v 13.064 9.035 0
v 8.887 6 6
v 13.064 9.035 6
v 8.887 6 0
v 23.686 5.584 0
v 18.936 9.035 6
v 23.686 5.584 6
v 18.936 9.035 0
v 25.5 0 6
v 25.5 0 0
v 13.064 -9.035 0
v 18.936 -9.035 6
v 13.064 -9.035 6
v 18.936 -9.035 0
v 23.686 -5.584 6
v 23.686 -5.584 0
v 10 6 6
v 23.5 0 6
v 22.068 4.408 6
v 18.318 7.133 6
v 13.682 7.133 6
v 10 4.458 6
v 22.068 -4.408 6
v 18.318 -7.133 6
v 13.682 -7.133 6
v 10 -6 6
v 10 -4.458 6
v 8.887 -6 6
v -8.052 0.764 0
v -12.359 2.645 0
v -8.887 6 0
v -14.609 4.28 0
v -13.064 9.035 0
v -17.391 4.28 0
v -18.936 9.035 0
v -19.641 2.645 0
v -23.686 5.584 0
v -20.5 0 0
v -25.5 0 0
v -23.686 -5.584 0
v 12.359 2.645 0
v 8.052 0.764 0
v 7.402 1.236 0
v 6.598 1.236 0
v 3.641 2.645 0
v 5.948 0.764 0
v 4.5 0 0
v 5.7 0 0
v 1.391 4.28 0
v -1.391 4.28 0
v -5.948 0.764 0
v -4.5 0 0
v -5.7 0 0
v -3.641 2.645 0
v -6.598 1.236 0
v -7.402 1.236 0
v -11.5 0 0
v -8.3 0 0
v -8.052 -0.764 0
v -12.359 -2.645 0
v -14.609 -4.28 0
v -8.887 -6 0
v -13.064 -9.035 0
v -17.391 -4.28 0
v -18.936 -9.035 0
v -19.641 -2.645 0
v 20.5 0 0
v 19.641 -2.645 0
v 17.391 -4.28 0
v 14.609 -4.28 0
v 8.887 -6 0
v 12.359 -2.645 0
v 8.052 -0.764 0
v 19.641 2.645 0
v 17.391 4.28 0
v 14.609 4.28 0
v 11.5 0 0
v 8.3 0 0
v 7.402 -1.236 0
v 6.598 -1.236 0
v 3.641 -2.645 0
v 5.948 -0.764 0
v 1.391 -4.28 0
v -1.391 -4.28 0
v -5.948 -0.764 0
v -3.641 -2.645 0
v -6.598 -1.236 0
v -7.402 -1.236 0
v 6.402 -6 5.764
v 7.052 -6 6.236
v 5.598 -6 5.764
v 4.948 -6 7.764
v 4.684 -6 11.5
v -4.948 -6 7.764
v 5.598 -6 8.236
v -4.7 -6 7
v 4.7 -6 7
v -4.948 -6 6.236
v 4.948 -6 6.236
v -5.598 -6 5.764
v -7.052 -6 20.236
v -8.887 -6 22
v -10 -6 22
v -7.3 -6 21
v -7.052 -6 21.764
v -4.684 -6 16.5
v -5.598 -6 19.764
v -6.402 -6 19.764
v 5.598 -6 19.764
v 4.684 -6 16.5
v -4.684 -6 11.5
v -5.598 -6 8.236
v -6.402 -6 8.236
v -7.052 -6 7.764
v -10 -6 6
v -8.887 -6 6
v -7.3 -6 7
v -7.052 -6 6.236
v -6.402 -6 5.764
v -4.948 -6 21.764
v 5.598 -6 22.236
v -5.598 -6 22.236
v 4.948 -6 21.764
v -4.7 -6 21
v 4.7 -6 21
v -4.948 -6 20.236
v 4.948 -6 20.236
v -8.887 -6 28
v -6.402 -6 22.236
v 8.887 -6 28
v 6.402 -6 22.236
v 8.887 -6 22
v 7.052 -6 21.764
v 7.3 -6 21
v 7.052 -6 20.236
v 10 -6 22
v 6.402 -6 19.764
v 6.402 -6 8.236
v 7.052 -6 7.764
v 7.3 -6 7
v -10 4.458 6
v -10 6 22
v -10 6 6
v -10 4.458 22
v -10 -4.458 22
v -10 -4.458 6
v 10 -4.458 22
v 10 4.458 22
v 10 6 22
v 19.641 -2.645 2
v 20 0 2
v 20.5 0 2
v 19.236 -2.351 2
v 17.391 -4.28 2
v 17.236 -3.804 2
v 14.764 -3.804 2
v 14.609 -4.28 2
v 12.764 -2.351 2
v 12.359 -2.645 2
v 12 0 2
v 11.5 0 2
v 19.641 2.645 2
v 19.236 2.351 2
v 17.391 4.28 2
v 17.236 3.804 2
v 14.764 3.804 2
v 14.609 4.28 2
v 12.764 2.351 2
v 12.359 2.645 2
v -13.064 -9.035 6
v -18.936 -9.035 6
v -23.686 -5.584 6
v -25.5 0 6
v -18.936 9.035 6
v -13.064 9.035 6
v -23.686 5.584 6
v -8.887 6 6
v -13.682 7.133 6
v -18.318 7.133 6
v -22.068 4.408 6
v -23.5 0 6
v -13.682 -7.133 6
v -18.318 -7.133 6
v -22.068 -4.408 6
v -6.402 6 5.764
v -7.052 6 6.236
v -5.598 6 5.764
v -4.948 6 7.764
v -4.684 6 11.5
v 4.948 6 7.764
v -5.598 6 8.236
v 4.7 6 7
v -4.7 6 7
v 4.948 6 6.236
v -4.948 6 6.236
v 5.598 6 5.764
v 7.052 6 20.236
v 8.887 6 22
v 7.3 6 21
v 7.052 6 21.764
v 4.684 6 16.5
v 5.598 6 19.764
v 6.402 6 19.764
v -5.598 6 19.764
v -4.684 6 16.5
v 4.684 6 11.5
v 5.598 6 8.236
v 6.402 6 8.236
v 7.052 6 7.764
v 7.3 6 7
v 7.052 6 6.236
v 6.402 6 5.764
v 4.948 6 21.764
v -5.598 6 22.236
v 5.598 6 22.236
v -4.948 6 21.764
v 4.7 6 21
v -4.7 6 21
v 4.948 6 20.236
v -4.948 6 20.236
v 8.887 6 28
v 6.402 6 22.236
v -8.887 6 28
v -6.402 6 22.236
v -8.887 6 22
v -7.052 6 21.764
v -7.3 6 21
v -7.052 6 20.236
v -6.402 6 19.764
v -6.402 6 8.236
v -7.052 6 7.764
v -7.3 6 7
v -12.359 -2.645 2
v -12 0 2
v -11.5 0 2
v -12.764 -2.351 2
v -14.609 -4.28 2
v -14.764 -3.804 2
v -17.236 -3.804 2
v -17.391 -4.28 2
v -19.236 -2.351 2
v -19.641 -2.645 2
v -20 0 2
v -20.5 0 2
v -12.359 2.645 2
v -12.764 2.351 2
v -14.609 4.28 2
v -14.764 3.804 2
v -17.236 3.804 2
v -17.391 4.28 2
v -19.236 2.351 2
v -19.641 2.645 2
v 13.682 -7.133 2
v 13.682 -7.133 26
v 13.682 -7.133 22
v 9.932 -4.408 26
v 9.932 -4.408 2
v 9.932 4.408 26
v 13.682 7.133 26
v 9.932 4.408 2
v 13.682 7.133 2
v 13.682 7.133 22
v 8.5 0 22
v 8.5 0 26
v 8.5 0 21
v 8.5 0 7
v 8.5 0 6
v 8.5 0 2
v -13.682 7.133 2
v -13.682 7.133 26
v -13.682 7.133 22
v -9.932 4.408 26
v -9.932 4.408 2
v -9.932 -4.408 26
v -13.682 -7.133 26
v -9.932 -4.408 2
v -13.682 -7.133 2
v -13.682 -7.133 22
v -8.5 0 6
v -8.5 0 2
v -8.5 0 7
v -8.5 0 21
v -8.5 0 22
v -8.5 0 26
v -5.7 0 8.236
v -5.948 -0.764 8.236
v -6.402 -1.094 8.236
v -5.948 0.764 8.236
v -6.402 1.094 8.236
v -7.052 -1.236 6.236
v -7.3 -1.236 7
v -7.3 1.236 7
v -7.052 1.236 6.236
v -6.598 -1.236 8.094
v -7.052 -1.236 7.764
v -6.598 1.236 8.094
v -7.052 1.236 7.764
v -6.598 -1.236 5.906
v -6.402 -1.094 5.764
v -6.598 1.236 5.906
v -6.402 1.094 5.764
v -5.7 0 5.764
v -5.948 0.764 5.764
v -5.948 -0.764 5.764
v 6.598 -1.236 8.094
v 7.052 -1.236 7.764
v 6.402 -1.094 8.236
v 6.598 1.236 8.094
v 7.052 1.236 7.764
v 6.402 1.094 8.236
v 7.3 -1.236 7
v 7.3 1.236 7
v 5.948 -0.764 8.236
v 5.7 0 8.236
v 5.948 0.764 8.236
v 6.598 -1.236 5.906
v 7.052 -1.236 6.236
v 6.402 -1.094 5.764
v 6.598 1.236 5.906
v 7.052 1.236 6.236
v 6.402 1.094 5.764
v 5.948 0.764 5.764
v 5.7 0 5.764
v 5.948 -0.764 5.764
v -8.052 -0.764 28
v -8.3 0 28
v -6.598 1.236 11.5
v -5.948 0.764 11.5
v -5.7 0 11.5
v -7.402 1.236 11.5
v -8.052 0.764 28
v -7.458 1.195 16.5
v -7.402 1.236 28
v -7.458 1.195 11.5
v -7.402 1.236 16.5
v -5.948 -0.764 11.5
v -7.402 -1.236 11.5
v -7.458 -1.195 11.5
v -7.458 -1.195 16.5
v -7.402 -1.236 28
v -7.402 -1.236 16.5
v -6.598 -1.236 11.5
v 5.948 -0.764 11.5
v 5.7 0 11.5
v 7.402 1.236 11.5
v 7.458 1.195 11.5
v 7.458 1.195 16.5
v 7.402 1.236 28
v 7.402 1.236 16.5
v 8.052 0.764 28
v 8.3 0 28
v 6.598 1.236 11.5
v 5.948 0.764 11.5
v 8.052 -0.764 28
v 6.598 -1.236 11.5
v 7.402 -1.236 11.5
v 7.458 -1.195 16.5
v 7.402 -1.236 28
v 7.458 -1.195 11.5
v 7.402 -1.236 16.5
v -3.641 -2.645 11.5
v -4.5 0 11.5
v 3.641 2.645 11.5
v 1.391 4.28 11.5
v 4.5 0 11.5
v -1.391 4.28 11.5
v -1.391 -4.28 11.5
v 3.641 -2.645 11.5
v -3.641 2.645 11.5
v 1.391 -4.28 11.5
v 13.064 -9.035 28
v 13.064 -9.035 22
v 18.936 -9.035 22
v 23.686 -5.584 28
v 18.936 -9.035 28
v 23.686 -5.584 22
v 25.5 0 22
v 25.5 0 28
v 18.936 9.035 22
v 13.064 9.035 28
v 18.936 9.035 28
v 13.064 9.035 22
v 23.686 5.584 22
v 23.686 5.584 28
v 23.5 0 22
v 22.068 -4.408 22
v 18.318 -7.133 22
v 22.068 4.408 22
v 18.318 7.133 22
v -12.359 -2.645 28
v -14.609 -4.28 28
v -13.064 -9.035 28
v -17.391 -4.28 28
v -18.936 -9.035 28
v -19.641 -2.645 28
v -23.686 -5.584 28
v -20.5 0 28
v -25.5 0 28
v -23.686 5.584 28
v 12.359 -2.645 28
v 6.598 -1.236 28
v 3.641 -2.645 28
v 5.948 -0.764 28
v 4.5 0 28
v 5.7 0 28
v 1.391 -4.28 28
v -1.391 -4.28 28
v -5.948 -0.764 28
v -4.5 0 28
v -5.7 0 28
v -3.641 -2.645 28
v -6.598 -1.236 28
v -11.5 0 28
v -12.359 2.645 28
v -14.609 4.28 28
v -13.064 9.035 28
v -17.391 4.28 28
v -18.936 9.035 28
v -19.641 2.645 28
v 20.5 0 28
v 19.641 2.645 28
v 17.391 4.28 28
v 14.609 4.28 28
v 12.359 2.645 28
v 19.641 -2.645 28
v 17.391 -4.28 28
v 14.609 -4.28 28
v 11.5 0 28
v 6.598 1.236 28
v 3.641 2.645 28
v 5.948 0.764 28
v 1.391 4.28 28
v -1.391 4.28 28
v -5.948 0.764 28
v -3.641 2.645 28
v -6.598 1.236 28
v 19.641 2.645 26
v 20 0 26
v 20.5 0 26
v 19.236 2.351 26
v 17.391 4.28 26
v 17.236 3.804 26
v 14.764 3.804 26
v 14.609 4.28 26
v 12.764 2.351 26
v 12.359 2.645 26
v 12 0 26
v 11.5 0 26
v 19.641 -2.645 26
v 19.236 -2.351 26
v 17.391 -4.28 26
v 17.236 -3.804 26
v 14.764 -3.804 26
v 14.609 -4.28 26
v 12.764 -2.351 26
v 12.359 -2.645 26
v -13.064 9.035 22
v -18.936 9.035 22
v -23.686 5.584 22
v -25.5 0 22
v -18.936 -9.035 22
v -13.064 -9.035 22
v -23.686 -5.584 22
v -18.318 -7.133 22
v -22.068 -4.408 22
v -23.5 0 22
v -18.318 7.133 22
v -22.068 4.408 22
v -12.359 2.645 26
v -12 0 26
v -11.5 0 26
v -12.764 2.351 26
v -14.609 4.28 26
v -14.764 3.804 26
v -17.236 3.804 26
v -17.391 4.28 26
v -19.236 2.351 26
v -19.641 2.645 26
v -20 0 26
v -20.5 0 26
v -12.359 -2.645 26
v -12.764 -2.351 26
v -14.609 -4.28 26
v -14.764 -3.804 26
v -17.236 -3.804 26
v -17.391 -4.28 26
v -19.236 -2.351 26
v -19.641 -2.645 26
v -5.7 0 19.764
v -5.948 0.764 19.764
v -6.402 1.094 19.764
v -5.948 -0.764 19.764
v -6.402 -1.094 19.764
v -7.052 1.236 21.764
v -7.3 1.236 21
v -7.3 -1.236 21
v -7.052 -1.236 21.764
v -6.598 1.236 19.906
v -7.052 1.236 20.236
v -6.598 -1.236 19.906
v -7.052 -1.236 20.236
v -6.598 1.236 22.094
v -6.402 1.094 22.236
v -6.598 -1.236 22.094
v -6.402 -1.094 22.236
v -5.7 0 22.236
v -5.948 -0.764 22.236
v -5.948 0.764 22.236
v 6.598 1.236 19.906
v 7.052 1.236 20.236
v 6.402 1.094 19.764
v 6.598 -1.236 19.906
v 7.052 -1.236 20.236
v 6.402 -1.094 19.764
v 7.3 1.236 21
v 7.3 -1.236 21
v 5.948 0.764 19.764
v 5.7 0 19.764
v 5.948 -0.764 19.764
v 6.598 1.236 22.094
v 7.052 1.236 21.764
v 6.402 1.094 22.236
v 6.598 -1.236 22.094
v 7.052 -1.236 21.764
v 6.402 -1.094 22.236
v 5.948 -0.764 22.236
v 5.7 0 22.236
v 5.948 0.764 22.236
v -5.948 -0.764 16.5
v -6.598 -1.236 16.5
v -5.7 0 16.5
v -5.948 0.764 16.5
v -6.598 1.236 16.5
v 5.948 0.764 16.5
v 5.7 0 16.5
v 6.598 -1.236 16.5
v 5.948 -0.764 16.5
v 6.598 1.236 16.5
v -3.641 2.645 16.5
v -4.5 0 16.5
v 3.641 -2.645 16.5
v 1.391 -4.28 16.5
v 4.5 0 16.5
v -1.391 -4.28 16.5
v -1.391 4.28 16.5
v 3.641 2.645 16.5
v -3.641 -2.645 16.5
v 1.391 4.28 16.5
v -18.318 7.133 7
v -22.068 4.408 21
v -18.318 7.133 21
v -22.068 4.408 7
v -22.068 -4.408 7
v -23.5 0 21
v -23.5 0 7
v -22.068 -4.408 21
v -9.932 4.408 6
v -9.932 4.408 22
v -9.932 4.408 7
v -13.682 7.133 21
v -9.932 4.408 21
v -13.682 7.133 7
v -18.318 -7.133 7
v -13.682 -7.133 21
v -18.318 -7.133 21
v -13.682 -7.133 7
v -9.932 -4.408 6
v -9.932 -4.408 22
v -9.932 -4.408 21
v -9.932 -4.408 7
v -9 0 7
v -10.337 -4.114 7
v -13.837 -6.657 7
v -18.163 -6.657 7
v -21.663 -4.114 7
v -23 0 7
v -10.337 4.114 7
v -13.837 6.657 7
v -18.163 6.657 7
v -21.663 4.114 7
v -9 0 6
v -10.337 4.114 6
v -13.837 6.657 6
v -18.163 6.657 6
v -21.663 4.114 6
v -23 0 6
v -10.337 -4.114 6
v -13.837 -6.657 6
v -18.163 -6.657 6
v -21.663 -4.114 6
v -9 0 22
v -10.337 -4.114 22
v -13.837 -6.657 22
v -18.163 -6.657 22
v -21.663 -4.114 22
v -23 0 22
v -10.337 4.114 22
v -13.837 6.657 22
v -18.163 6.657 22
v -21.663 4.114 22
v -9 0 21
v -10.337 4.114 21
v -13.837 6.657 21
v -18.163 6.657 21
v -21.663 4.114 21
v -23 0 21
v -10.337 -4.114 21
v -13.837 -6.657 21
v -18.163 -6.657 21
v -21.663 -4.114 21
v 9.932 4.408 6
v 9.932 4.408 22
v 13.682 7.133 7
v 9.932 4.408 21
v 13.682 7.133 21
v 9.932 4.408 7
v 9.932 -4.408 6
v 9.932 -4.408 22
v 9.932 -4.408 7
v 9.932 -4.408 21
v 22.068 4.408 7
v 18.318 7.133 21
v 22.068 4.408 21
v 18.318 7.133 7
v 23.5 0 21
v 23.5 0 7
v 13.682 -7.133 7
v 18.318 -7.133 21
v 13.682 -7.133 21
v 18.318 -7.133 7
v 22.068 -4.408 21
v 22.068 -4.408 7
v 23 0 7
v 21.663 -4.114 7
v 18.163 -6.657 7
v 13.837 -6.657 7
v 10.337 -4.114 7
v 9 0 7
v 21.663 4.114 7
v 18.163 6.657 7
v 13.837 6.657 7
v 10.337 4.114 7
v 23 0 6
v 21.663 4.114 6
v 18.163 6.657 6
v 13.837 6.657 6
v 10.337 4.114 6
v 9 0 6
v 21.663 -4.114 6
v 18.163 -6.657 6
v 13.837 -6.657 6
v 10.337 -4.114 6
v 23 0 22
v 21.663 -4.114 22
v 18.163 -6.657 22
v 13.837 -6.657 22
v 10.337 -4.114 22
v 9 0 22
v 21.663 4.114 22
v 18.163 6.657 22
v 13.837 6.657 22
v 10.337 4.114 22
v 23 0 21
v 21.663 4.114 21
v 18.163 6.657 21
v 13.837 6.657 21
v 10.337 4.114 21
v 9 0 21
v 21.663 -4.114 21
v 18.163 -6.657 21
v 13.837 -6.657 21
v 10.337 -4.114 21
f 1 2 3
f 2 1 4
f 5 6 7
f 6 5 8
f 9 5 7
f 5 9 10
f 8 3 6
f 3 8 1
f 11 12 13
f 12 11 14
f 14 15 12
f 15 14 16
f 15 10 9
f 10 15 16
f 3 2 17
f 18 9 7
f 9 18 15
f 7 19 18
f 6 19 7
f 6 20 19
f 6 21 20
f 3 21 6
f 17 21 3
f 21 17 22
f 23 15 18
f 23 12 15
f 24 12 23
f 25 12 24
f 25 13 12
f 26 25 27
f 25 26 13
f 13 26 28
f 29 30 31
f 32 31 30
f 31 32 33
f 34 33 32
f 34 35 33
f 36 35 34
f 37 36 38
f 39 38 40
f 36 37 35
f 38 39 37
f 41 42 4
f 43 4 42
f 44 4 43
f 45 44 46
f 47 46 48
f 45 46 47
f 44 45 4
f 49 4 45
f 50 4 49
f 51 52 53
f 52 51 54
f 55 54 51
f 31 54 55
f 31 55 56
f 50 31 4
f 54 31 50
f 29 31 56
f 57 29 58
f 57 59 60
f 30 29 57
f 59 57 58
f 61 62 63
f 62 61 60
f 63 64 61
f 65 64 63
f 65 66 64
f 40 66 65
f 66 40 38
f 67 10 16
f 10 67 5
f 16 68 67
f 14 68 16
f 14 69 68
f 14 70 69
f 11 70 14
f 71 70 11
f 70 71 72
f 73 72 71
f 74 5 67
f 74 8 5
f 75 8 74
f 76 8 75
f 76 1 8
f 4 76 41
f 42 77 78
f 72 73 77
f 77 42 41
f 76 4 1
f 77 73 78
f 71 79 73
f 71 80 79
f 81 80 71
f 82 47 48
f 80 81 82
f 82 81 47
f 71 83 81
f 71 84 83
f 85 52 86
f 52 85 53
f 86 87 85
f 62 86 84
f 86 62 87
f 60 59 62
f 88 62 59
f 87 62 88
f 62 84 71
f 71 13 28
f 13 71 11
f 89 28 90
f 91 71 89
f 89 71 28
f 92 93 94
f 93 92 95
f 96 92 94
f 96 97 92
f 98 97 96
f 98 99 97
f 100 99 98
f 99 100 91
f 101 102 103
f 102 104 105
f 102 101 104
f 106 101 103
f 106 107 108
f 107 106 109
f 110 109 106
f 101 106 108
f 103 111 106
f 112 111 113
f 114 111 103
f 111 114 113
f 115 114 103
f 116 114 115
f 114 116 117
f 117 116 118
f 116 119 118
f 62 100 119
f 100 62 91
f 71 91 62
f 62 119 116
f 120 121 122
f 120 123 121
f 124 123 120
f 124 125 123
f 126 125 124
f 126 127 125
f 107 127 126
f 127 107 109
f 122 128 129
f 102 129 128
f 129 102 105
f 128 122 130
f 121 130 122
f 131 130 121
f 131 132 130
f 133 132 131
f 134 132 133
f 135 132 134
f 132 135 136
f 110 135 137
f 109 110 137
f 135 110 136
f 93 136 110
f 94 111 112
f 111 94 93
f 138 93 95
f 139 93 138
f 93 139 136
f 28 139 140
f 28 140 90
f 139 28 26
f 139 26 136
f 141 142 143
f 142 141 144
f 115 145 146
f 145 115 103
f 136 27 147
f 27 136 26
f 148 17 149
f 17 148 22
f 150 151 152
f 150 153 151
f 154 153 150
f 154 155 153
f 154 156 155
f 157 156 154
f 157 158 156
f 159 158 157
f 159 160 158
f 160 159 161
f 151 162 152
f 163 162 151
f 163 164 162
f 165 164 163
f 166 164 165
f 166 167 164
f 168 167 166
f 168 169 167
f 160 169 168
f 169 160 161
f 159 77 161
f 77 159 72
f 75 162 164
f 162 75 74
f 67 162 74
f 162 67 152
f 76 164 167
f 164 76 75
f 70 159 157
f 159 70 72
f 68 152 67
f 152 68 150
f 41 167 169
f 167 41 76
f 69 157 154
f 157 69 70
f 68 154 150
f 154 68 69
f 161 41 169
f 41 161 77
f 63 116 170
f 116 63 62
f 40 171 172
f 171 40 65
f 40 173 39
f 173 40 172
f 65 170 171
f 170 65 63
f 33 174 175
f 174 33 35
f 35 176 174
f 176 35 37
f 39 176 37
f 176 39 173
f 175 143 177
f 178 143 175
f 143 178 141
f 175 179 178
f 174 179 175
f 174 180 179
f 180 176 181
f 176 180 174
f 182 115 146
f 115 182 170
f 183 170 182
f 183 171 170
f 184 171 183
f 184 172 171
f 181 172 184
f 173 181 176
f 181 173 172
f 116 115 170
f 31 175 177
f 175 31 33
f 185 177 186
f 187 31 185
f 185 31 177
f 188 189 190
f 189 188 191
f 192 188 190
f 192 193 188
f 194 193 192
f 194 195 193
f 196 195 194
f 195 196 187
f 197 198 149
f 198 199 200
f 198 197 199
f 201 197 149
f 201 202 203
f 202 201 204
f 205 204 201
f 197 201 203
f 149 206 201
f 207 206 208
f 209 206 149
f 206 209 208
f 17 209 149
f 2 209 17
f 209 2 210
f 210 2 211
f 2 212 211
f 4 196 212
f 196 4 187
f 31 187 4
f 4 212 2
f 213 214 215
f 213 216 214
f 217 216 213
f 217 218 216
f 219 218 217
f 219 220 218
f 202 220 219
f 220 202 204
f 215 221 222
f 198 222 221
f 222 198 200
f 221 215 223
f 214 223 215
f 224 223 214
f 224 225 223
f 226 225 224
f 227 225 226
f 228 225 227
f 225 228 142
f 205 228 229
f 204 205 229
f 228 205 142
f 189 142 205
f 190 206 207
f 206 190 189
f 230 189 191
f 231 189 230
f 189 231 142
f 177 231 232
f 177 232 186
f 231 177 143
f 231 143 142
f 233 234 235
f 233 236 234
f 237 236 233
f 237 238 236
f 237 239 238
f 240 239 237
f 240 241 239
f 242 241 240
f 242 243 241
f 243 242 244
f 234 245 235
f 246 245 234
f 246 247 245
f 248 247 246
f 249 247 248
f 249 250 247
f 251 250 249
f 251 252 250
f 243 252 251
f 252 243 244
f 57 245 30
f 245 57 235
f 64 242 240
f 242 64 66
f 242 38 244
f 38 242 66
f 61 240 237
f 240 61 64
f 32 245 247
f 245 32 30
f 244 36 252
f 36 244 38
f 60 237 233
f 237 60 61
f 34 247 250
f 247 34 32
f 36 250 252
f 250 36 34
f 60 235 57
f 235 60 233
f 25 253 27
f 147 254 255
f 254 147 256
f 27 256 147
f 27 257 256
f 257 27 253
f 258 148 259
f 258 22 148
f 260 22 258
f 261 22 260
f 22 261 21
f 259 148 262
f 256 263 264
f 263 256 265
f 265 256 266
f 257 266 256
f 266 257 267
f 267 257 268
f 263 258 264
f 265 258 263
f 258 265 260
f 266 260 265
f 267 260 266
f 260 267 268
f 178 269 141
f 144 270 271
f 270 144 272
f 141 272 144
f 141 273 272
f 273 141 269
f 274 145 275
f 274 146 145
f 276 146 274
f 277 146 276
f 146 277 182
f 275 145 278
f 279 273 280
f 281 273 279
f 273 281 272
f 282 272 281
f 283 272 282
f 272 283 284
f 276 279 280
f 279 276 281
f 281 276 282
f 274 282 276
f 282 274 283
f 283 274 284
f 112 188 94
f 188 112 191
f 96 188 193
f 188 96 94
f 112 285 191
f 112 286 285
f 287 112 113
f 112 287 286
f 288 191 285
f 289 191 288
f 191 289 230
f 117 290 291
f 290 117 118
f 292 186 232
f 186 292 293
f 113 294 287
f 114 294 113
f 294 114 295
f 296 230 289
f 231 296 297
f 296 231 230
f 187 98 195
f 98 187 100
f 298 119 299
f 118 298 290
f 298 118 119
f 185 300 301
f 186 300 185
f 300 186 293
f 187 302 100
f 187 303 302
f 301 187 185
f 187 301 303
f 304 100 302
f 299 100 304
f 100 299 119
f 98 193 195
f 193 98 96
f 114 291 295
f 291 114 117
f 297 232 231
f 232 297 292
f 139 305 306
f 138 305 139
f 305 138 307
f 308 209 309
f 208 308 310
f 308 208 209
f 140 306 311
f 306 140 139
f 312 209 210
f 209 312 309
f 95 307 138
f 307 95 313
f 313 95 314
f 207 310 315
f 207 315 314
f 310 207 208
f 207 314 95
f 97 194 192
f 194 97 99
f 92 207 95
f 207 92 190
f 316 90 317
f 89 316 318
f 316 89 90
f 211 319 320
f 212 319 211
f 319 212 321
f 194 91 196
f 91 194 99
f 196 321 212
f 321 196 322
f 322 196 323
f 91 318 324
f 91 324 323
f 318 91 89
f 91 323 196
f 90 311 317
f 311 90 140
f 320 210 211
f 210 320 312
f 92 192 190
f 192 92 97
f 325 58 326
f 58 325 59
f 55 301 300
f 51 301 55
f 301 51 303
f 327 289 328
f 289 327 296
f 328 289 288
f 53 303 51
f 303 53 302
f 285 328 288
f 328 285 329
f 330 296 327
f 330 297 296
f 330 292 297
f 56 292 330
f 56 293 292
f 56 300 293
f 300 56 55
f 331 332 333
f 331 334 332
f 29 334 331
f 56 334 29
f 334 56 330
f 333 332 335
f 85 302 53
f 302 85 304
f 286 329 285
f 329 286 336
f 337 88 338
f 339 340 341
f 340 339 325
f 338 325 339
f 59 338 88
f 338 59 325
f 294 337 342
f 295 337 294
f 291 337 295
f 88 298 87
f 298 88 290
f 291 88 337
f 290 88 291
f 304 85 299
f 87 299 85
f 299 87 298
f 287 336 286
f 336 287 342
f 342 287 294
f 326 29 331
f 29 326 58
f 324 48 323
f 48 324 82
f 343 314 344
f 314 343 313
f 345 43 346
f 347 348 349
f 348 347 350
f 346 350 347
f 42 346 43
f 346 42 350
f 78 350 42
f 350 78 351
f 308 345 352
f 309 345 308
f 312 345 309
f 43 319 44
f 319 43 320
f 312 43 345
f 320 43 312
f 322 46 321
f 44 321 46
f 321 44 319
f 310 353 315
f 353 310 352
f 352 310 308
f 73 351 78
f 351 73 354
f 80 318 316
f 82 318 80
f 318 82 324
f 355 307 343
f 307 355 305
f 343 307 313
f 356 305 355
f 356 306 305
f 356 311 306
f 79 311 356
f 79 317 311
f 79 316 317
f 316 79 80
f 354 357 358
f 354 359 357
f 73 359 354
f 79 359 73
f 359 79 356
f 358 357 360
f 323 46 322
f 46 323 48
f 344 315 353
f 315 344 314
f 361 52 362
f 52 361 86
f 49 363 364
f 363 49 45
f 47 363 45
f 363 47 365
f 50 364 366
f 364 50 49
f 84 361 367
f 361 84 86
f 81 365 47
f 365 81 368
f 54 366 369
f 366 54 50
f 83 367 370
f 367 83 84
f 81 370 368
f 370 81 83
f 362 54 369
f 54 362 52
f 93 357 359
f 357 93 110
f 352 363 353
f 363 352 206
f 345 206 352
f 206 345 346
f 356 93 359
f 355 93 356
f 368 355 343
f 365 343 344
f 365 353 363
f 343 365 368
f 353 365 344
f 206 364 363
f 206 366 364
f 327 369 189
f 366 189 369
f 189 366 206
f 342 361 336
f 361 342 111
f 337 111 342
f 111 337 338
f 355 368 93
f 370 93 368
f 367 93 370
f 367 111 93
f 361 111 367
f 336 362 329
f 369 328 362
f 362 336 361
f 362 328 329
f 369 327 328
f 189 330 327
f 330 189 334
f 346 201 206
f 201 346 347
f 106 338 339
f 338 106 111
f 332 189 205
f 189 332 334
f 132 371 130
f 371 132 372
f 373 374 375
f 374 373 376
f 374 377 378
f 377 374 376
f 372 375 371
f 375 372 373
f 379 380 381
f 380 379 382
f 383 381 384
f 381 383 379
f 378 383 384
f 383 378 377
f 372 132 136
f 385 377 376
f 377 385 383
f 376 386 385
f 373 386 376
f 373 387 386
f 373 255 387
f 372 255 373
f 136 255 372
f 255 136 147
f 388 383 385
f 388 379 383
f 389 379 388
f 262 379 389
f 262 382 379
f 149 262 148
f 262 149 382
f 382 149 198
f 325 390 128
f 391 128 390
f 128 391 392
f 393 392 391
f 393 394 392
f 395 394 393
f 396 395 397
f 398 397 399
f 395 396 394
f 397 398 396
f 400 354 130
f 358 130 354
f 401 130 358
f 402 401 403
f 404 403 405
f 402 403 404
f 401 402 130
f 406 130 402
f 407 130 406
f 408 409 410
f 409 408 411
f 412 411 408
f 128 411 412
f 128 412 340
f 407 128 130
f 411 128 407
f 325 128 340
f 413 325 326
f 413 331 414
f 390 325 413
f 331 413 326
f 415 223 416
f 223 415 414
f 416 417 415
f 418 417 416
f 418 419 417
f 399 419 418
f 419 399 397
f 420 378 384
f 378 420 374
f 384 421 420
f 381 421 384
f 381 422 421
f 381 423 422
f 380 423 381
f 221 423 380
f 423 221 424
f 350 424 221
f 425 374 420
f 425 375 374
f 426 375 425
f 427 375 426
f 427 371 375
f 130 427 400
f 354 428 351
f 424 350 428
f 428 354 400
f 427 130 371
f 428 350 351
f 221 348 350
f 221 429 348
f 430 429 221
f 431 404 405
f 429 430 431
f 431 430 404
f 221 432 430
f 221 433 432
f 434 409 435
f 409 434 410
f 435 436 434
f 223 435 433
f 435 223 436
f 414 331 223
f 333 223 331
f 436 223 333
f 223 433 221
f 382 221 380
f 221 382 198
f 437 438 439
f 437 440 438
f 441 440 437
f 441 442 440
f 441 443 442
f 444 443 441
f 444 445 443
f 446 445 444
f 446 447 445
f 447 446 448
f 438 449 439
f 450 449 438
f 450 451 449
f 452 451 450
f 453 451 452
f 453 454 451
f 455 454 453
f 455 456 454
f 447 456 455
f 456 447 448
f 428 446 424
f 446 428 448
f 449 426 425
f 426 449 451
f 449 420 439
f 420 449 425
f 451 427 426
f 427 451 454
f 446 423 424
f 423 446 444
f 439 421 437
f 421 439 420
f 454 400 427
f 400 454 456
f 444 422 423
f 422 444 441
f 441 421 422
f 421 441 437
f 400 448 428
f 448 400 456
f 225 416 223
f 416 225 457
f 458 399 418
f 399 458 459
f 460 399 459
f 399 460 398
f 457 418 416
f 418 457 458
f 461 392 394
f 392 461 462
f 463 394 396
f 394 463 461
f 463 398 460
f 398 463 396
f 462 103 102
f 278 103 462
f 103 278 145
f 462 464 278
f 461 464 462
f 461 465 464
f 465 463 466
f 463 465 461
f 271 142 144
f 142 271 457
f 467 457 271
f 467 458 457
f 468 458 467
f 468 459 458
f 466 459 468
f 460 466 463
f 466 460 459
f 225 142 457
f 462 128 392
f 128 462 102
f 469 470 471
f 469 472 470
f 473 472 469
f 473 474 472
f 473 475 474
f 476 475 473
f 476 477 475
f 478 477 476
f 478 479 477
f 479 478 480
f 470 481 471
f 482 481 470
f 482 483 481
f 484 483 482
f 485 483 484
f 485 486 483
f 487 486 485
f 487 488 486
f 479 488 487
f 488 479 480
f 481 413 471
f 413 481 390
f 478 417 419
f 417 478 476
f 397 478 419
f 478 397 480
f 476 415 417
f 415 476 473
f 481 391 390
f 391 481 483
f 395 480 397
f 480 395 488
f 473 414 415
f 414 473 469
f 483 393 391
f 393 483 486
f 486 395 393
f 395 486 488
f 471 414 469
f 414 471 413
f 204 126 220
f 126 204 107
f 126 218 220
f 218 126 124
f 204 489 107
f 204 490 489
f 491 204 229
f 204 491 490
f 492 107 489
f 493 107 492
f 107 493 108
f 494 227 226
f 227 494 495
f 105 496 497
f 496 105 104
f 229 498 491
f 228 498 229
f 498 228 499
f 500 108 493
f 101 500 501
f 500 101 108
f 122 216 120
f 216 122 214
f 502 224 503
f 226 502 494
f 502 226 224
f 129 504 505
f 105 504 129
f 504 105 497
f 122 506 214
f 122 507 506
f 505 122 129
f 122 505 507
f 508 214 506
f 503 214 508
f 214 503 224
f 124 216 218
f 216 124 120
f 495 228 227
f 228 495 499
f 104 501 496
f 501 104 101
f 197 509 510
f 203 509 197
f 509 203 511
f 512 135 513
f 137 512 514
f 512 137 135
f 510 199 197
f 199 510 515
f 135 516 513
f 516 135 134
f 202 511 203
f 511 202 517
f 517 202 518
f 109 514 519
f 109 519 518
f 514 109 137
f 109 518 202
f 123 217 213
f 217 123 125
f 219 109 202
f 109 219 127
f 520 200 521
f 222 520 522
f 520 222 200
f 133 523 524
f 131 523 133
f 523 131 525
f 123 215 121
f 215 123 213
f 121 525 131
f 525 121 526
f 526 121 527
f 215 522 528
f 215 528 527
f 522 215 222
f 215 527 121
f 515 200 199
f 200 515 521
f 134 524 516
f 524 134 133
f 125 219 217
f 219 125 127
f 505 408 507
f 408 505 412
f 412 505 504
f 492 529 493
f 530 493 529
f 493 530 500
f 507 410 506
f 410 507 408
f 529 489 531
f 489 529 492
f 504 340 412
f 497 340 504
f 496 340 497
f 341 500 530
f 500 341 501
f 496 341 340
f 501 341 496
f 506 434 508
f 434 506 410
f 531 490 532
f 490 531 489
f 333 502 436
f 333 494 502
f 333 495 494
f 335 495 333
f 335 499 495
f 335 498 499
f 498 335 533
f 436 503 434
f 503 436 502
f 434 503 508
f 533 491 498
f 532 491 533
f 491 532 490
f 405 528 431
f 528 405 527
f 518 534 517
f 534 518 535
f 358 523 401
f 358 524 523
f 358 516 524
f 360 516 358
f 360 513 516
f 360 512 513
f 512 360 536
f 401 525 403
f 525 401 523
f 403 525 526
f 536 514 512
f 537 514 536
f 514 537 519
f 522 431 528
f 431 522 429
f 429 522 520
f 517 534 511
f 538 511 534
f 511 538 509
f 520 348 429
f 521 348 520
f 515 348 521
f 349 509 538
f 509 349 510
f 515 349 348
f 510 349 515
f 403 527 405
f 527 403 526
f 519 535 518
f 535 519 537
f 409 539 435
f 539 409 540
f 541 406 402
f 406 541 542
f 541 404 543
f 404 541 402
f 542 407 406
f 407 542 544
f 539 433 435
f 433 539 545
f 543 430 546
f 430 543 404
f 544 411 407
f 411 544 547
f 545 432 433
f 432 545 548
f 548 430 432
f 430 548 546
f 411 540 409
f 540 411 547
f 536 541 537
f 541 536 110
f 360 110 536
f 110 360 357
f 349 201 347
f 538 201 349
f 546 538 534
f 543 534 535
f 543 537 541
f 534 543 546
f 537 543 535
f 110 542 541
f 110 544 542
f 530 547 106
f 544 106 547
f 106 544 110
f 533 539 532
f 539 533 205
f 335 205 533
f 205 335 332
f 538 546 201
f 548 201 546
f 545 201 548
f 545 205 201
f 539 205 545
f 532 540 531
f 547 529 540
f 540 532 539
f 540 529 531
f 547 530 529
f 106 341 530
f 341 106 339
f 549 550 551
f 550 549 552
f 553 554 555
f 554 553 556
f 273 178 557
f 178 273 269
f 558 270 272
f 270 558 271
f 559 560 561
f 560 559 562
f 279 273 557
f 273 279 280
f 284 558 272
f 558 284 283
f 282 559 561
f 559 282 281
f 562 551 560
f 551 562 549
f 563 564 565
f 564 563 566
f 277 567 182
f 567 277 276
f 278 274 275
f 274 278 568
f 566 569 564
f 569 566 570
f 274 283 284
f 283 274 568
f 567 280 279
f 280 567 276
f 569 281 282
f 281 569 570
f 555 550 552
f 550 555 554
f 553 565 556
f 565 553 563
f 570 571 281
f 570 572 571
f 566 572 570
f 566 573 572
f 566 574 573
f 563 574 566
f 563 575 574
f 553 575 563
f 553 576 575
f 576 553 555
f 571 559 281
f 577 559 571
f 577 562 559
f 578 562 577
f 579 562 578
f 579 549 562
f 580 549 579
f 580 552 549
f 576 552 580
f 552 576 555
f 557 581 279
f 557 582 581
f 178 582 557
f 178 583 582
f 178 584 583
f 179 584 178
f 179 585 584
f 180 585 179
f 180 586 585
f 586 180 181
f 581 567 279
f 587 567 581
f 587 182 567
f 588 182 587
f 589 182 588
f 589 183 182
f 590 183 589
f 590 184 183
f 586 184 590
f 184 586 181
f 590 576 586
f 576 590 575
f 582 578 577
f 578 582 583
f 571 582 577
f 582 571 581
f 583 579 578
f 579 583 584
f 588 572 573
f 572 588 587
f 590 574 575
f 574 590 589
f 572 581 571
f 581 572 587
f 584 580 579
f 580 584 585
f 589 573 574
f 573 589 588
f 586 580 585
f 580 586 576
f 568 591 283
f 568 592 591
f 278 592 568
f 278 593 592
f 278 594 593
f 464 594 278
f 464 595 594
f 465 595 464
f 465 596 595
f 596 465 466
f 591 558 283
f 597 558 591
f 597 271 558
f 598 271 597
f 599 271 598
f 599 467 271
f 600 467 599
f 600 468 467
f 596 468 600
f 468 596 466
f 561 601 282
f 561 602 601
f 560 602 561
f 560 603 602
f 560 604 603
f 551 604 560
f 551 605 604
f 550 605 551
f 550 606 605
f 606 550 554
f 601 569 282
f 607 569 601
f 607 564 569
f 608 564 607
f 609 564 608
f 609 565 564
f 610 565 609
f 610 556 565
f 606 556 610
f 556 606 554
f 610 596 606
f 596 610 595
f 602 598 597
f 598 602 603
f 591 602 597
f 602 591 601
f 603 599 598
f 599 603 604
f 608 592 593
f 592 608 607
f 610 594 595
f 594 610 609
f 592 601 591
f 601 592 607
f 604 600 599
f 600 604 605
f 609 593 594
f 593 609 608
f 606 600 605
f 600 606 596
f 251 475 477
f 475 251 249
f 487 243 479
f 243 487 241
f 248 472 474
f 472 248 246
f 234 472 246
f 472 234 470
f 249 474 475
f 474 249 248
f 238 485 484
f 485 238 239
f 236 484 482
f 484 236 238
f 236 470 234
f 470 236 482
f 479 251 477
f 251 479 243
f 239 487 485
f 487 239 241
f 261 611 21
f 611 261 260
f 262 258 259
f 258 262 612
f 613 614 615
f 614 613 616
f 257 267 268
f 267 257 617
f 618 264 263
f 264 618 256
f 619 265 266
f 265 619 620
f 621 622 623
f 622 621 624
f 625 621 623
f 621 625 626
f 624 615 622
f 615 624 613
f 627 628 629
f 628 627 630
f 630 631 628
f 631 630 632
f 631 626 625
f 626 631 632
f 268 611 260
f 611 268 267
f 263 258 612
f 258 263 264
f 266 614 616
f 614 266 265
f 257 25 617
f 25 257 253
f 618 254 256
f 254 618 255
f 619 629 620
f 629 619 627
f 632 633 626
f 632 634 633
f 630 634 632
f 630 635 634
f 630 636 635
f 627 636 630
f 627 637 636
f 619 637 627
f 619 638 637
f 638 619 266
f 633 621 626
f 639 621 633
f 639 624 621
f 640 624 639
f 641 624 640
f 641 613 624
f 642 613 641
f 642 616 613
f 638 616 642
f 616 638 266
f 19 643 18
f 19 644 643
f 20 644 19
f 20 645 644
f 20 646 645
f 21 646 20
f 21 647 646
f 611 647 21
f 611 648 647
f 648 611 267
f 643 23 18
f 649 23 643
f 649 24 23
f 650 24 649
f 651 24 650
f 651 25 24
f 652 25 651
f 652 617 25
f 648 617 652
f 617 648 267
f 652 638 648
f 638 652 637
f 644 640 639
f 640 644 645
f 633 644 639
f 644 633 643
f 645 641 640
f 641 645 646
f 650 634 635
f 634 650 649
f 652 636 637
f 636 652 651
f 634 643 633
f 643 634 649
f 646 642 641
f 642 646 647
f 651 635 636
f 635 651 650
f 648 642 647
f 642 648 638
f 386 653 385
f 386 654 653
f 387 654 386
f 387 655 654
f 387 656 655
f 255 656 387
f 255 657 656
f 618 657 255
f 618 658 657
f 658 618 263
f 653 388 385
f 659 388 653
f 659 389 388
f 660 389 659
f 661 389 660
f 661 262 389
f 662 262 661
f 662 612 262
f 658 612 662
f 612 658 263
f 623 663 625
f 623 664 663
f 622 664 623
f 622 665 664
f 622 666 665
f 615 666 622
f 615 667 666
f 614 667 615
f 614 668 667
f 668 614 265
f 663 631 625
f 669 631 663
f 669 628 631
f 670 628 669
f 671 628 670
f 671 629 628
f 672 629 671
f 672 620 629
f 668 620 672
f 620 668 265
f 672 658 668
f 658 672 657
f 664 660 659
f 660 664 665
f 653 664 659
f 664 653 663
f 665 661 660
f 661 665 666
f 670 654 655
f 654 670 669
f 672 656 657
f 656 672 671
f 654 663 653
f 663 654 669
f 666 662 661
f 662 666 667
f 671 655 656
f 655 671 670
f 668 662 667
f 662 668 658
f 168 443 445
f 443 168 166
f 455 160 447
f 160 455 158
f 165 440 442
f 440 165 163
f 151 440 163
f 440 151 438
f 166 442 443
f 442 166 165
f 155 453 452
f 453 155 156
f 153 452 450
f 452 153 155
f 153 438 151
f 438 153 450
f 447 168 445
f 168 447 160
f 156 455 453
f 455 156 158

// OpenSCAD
// file: LM8UU.scad
module hex(s,d=14){


linear_extrude(s)
hull(){
for(i = [0:5])
rotate([0,0,i*360/6])
translate([d/2,0,0]) 
circle([1,1]);
}

}




module LM8UU(){
h = 24;
d = 15/2;
inner = 8/2; //m8
offset = 4;

difference(){
ring(h,"silver",d,d-1);

for(i = [offset,h-offset-1]) //why the -1?
translate([0,0,i]) ring(1,"silver",d+1,d-.5);

}


ring(h,"black",d-1,inner);








}




module ring(height,colour,outer,inner){

color(colour){
difference(){
cylinder(r=outer,h=height);

translate([0,0,-.5]) cylinder(r=inner,h=height+1);

}
}
}
// main file
include <LM8UU.scad>

carriage();
$fn = 10;

module carriage_section(){
sheeth_h = 6;
h = 28/2;

color("white"){


difference(){
union(){
for(i = [0,180]){

rotate([0,0,i])

translate([16,0,0])
difference(){
union(){
cylinder(r=15/2+2,h=sheeth_h);

rotate([0,0,90]) translate([-6,6,0])	cube([10,20,h]);

}

translate([0,0,2]) cylinder(r=15/2,h=sheeth_h+1);
translate([0,0,-1]) cylinder(r=9/2,h=sheeth_h*2+1);


}



}

}

translate([0,0,-.5]) cylinder(r=9/2,h=h+1);
translate([0,0,h-2.5]) rotate([0,0,0]) hex(3.5);

for(i = [0,180])
rotate([0,0,i])
translate([16,0,2]) cylinder(r=15/2,h=sheeth_h*2+1);



//drill some mount holes
for(i = [-6,6])
translate([i,15,h/2])
rotate([90,0,0])	cylinder(r=1.3,25);


//drill some assembly holes
for(i = [-7,7])
translate([i,0,-.5])
rotate([0,0,0])	cylinder(r=1.3,25);


}






}





}


module carriage(){

carriage_section();


translate([0,0,28])
rotate([180,0,0])
carriage_section();



for(i = [-16,16])
translate([i,0,2])
LM8UU();







}
